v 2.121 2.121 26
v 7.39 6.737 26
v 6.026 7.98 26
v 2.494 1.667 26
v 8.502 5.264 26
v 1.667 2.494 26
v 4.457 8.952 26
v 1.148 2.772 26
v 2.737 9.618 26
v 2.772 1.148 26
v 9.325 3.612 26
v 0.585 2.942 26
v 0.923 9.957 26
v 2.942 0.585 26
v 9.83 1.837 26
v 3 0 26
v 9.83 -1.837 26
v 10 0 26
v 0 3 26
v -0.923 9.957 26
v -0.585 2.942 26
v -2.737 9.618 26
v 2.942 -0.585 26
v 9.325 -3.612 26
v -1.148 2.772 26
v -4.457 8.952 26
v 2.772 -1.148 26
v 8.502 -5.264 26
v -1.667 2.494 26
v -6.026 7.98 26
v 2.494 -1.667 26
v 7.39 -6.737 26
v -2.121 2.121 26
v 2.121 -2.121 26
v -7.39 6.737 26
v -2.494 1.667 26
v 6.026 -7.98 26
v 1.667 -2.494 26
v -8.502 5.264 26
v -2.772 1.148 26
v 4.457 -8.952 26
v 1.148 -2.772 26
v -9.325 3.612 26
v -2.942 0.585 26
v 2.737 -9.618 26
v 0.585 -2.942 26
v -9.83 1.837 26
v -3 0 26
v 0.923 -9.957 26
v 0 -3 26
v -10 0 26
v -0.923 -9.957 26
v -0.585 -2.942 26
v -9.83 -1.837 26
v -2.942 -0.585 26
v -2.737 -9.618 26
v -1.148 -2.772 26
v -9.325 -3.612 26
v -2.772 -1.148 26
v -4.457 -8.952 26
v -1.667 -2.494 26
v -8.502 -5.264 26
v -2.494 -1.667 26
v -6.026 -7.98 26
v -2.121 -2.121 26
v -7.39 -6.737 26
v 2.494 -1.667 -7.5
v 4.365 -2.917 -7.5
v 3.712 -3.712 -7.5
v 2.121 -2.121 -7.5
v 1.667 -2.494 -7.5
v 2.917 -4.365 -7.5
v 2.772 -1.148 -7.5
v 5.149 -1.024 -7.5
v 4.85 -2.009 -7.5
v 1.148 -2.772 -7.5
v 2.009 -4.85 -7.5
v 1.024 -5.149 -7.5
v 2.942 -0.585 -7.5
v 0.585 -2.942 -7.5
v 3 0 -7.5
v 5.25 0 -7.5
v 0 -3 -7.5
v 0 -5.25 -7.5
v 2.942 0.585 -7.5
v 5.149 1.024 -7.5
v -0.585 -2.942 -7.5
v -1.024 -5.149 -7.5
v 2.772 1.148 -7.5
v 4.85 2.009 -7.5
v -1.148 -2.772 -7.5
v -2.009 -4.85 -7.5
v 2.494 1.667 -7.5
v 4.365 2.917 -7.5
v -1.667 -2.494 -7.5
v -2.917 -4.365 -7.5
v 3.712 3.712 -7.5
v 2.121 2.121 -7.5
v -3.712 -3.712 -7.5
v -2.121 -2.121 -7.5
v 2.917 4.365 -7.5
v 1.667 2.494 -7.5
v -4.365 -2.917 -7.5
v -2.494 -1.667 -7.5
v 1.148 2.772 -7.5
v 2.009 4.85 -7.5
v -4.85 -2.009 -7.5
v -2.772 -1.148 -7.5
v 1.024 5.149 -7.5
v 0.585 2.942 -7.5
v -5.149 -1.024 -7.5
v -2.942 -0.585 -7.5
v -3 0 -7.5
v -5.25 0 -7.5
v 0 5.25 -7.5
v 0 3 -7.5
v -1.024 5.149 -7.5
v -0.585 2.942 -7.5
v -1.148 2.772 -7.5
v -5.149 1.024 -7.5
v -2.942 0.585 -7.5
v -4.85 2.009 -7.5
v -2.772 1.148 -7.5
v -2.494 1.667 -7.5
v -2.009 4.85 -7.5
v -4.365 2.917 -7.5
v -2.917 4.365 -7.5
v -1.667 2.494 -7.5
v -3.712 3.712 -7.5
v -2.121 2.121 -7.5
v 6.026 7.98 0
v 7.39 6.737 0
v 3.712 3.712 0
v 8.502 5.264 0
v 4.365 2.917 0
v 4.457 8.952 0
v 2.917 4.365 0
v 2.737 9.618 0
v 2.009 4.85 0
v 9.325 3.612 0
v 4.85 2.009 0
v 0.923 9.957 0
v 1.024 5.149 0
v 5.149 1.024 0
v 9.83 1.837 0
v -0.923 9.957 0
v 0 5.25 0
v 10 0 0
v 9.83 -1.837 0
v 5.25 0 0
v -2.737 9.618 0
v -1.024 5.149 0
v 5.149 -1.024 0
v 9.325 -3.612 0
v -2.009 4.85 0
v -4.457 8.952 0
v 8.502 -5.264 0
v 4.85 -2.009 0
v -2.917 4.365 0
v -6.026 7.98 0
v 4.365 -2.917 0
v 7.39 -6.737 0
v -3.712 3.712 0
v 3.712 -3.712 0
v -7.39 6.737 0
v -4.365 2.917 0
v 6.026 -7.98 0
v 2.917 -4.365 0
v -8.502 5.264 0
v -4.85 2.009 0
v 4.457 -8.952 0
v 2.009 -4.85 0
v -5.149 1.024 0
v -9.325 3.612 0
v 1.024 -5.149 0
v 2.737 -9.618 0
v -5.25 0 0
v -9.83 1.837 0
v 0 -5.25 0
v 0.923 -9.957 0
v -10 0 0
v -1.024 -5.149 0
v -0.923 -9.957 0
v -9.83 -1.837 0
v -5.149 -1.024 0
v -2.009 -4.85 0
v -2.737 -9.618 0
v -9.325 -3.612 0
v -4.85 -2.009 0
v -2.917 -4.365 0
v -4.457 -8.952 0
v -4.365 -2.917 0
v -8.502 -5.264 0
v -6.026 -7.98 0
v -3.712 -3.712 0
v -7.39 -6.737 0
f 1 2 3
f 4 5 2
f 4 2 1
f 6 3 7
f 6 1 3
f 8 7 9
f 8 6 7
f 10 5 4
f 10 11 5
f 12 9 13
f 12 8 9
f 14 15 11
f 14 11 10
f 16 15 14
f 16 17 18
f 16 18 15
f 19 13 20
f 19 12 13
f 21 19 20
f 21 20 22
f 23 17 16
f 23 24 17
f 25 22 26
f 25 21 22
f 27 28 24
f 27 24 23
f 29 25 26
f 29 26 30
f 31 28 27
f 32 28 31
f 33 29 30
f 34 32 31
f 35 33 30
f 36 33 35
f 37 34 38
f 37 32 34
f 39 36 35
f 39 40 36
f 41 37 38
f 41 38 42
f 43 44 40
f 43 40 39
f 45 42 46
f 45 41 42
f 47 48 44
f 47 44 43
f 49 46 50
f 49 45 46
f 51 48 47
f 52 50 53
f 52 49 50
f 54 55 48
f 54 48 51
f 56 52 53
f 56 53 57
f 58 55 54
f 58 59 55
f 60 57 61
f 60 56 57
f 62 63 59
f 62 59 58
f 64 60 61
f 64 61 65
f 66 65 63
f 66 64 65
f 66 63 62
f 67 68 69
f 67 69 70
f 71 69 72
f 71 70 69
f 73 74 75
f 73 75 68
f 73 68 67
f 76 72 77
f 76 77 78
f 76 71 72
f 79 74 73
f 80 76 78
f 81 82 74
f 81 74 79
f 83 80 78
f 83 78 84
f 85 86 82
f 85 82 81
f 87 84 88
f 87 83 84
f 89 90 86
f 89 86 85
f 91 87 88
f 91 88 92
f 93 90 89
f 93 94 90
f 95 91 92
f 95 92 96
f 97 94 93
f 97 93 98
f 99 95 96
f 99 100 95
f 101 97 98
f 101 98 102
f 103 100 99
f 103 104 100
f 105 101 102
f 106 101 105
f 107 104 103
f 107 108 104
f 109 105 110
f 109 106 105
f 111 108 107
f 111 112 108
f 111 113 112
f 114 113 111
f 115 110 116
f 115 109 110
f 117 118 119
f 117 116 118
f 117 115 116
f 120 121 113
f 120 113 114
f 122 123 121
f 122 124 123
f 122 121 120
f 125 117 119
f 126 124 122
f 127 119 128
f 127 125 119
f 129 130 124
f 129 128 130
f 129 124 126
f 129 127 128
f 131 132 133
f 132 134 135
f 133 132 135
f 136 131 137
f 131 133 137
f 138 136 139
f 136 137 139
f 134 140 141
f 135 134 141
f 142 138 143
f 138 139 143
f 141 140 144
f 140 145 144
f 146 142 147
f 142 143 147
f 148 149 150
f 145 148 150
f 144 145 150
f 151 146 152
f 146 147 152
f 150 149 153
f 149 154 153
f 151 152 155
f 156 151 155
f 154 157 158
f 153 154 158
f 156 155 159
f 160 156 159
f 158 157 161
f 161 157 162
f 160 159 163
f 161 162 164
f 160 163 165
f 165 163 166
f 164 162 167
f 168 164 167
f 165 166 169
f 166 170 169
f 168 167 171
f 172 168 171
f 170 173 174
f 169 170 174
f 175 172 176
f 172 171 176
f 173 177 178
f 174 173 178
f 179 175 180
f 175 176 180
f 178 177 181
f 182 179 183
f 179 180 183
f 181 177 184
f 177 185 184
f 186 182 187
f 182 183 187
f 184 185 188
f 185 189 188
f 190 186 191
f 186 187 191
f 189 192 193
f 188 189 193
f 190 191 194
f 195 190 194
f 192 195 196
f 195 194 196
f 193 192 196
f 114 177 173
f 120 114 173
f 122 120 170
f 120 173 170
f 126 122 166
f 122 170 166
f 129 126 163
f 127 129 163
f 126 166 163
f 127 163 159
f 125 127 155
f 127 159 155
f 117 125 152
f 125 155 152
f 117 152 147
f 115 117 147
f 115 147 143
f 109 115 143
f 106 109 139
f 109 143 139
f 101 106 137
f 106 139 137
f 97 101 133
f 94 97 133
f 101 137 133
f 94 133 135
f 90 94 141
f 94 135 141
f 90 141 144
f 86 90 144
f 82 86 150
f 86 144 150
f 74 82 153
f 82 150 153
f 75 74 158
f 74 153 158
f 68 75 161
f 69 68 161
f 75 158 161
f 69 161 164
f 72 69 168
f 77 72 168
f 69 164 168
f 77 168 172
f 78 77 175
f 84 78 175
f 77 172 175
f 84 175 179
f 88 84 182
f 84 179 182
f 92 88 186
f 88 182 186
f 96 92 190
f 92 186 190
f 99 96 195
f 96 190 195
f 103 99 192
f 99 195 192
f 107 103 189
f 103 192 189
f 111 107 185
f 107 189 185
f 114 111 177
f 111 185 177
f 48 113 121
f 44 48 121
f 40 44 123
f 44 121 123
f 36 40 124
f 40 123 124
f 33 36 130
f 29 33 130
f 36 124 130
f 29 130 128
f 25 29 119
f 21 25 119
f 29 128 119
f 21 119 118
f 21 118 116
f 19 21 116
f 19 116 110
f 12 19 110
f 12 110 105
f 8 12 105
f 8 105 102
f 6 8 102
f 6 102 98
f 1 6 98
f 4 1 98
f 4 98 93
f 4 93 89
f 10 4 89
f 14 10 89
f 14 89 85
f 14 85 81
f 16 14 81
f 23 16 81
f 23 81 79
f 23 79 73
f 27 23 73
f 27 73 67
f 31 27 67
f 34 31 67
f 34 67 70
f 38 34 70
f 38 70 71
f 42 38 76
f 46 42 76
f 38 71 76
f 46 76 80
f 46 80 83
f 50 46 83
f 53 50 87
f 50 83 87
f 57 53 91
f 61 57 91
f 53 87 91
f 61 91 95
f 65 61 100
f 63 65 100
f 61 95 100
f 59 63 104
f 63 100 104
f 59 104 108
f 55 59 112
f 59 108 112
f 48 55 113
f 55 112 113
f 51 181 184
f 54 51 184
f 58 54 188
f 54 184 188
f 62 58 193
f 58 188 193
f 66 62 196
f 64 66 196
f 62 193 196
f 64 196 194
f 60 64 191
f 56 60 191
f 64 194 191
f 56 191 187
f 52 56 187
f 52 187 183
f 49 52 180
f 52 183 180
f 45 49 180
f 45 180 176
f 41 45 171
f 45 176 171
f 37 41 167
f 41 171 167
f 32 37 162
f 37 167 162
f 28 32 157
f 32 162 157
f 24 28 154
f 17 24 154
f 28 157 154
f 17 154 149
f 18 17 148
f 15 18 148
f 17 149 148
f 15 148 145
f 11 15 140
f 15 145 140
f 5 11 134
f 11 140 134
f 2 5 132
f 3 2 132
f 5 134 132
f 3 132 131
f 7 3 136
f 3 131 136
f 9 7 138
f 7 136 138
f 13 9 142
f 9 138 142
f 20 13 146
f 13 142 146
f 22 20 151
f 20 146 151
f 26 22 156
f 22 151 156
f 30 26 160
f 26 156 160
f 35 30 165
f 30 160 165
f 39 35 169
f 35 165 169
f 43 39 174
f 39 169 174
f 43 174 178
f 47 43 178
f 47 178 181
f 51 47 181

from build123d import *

# Parameters (mm, degrees)
SKETCH_1_R          = 10
EXTRUDE_1_DEPTH     = 26
SKETCH_2_R          = 5.25
EXTRUDE_2_DEPTH     = 7.5
SKETCH_3_R          = 3
CUT_EXTRUDE_1_DEPTH = 37.362755671


with BuildPart() as part:
    # 草图1 → 凸台-拉伸1 (new body)
    with BuildSketch(Plane.XY):
        with Locations(Location((0, 0, 0), (0, 0, 180))):
            Circle(SKETCH_1_R)
    extrude(amount=EXTRUDE_1_DEPTH)

    # 草图2 → 凸台-拉伸2 (add)
    with BuildSketch(Plane(origin=(0, 0, 0), x_dir=(-1, 0, 0), z_dir=(0, 0, -1))):
        Circle(SKETCH_2_R)
    extrude(amount=EXTRUDE_2_DEPTH)

    # 草图3 → 切除-拉伸1 (cut, through all)
    with BuildSketch(Plane(origin=(0, 0, -7.5), x_dir=(-1, 0, 0), z_dir=(0, 0, -1))):
        Circle(SKETCH_3_R)
    extrude(amount=-CUT_EXTRUDE_1_DEPTH, mode=Mode.SUBTRACT)


solid = part.part
